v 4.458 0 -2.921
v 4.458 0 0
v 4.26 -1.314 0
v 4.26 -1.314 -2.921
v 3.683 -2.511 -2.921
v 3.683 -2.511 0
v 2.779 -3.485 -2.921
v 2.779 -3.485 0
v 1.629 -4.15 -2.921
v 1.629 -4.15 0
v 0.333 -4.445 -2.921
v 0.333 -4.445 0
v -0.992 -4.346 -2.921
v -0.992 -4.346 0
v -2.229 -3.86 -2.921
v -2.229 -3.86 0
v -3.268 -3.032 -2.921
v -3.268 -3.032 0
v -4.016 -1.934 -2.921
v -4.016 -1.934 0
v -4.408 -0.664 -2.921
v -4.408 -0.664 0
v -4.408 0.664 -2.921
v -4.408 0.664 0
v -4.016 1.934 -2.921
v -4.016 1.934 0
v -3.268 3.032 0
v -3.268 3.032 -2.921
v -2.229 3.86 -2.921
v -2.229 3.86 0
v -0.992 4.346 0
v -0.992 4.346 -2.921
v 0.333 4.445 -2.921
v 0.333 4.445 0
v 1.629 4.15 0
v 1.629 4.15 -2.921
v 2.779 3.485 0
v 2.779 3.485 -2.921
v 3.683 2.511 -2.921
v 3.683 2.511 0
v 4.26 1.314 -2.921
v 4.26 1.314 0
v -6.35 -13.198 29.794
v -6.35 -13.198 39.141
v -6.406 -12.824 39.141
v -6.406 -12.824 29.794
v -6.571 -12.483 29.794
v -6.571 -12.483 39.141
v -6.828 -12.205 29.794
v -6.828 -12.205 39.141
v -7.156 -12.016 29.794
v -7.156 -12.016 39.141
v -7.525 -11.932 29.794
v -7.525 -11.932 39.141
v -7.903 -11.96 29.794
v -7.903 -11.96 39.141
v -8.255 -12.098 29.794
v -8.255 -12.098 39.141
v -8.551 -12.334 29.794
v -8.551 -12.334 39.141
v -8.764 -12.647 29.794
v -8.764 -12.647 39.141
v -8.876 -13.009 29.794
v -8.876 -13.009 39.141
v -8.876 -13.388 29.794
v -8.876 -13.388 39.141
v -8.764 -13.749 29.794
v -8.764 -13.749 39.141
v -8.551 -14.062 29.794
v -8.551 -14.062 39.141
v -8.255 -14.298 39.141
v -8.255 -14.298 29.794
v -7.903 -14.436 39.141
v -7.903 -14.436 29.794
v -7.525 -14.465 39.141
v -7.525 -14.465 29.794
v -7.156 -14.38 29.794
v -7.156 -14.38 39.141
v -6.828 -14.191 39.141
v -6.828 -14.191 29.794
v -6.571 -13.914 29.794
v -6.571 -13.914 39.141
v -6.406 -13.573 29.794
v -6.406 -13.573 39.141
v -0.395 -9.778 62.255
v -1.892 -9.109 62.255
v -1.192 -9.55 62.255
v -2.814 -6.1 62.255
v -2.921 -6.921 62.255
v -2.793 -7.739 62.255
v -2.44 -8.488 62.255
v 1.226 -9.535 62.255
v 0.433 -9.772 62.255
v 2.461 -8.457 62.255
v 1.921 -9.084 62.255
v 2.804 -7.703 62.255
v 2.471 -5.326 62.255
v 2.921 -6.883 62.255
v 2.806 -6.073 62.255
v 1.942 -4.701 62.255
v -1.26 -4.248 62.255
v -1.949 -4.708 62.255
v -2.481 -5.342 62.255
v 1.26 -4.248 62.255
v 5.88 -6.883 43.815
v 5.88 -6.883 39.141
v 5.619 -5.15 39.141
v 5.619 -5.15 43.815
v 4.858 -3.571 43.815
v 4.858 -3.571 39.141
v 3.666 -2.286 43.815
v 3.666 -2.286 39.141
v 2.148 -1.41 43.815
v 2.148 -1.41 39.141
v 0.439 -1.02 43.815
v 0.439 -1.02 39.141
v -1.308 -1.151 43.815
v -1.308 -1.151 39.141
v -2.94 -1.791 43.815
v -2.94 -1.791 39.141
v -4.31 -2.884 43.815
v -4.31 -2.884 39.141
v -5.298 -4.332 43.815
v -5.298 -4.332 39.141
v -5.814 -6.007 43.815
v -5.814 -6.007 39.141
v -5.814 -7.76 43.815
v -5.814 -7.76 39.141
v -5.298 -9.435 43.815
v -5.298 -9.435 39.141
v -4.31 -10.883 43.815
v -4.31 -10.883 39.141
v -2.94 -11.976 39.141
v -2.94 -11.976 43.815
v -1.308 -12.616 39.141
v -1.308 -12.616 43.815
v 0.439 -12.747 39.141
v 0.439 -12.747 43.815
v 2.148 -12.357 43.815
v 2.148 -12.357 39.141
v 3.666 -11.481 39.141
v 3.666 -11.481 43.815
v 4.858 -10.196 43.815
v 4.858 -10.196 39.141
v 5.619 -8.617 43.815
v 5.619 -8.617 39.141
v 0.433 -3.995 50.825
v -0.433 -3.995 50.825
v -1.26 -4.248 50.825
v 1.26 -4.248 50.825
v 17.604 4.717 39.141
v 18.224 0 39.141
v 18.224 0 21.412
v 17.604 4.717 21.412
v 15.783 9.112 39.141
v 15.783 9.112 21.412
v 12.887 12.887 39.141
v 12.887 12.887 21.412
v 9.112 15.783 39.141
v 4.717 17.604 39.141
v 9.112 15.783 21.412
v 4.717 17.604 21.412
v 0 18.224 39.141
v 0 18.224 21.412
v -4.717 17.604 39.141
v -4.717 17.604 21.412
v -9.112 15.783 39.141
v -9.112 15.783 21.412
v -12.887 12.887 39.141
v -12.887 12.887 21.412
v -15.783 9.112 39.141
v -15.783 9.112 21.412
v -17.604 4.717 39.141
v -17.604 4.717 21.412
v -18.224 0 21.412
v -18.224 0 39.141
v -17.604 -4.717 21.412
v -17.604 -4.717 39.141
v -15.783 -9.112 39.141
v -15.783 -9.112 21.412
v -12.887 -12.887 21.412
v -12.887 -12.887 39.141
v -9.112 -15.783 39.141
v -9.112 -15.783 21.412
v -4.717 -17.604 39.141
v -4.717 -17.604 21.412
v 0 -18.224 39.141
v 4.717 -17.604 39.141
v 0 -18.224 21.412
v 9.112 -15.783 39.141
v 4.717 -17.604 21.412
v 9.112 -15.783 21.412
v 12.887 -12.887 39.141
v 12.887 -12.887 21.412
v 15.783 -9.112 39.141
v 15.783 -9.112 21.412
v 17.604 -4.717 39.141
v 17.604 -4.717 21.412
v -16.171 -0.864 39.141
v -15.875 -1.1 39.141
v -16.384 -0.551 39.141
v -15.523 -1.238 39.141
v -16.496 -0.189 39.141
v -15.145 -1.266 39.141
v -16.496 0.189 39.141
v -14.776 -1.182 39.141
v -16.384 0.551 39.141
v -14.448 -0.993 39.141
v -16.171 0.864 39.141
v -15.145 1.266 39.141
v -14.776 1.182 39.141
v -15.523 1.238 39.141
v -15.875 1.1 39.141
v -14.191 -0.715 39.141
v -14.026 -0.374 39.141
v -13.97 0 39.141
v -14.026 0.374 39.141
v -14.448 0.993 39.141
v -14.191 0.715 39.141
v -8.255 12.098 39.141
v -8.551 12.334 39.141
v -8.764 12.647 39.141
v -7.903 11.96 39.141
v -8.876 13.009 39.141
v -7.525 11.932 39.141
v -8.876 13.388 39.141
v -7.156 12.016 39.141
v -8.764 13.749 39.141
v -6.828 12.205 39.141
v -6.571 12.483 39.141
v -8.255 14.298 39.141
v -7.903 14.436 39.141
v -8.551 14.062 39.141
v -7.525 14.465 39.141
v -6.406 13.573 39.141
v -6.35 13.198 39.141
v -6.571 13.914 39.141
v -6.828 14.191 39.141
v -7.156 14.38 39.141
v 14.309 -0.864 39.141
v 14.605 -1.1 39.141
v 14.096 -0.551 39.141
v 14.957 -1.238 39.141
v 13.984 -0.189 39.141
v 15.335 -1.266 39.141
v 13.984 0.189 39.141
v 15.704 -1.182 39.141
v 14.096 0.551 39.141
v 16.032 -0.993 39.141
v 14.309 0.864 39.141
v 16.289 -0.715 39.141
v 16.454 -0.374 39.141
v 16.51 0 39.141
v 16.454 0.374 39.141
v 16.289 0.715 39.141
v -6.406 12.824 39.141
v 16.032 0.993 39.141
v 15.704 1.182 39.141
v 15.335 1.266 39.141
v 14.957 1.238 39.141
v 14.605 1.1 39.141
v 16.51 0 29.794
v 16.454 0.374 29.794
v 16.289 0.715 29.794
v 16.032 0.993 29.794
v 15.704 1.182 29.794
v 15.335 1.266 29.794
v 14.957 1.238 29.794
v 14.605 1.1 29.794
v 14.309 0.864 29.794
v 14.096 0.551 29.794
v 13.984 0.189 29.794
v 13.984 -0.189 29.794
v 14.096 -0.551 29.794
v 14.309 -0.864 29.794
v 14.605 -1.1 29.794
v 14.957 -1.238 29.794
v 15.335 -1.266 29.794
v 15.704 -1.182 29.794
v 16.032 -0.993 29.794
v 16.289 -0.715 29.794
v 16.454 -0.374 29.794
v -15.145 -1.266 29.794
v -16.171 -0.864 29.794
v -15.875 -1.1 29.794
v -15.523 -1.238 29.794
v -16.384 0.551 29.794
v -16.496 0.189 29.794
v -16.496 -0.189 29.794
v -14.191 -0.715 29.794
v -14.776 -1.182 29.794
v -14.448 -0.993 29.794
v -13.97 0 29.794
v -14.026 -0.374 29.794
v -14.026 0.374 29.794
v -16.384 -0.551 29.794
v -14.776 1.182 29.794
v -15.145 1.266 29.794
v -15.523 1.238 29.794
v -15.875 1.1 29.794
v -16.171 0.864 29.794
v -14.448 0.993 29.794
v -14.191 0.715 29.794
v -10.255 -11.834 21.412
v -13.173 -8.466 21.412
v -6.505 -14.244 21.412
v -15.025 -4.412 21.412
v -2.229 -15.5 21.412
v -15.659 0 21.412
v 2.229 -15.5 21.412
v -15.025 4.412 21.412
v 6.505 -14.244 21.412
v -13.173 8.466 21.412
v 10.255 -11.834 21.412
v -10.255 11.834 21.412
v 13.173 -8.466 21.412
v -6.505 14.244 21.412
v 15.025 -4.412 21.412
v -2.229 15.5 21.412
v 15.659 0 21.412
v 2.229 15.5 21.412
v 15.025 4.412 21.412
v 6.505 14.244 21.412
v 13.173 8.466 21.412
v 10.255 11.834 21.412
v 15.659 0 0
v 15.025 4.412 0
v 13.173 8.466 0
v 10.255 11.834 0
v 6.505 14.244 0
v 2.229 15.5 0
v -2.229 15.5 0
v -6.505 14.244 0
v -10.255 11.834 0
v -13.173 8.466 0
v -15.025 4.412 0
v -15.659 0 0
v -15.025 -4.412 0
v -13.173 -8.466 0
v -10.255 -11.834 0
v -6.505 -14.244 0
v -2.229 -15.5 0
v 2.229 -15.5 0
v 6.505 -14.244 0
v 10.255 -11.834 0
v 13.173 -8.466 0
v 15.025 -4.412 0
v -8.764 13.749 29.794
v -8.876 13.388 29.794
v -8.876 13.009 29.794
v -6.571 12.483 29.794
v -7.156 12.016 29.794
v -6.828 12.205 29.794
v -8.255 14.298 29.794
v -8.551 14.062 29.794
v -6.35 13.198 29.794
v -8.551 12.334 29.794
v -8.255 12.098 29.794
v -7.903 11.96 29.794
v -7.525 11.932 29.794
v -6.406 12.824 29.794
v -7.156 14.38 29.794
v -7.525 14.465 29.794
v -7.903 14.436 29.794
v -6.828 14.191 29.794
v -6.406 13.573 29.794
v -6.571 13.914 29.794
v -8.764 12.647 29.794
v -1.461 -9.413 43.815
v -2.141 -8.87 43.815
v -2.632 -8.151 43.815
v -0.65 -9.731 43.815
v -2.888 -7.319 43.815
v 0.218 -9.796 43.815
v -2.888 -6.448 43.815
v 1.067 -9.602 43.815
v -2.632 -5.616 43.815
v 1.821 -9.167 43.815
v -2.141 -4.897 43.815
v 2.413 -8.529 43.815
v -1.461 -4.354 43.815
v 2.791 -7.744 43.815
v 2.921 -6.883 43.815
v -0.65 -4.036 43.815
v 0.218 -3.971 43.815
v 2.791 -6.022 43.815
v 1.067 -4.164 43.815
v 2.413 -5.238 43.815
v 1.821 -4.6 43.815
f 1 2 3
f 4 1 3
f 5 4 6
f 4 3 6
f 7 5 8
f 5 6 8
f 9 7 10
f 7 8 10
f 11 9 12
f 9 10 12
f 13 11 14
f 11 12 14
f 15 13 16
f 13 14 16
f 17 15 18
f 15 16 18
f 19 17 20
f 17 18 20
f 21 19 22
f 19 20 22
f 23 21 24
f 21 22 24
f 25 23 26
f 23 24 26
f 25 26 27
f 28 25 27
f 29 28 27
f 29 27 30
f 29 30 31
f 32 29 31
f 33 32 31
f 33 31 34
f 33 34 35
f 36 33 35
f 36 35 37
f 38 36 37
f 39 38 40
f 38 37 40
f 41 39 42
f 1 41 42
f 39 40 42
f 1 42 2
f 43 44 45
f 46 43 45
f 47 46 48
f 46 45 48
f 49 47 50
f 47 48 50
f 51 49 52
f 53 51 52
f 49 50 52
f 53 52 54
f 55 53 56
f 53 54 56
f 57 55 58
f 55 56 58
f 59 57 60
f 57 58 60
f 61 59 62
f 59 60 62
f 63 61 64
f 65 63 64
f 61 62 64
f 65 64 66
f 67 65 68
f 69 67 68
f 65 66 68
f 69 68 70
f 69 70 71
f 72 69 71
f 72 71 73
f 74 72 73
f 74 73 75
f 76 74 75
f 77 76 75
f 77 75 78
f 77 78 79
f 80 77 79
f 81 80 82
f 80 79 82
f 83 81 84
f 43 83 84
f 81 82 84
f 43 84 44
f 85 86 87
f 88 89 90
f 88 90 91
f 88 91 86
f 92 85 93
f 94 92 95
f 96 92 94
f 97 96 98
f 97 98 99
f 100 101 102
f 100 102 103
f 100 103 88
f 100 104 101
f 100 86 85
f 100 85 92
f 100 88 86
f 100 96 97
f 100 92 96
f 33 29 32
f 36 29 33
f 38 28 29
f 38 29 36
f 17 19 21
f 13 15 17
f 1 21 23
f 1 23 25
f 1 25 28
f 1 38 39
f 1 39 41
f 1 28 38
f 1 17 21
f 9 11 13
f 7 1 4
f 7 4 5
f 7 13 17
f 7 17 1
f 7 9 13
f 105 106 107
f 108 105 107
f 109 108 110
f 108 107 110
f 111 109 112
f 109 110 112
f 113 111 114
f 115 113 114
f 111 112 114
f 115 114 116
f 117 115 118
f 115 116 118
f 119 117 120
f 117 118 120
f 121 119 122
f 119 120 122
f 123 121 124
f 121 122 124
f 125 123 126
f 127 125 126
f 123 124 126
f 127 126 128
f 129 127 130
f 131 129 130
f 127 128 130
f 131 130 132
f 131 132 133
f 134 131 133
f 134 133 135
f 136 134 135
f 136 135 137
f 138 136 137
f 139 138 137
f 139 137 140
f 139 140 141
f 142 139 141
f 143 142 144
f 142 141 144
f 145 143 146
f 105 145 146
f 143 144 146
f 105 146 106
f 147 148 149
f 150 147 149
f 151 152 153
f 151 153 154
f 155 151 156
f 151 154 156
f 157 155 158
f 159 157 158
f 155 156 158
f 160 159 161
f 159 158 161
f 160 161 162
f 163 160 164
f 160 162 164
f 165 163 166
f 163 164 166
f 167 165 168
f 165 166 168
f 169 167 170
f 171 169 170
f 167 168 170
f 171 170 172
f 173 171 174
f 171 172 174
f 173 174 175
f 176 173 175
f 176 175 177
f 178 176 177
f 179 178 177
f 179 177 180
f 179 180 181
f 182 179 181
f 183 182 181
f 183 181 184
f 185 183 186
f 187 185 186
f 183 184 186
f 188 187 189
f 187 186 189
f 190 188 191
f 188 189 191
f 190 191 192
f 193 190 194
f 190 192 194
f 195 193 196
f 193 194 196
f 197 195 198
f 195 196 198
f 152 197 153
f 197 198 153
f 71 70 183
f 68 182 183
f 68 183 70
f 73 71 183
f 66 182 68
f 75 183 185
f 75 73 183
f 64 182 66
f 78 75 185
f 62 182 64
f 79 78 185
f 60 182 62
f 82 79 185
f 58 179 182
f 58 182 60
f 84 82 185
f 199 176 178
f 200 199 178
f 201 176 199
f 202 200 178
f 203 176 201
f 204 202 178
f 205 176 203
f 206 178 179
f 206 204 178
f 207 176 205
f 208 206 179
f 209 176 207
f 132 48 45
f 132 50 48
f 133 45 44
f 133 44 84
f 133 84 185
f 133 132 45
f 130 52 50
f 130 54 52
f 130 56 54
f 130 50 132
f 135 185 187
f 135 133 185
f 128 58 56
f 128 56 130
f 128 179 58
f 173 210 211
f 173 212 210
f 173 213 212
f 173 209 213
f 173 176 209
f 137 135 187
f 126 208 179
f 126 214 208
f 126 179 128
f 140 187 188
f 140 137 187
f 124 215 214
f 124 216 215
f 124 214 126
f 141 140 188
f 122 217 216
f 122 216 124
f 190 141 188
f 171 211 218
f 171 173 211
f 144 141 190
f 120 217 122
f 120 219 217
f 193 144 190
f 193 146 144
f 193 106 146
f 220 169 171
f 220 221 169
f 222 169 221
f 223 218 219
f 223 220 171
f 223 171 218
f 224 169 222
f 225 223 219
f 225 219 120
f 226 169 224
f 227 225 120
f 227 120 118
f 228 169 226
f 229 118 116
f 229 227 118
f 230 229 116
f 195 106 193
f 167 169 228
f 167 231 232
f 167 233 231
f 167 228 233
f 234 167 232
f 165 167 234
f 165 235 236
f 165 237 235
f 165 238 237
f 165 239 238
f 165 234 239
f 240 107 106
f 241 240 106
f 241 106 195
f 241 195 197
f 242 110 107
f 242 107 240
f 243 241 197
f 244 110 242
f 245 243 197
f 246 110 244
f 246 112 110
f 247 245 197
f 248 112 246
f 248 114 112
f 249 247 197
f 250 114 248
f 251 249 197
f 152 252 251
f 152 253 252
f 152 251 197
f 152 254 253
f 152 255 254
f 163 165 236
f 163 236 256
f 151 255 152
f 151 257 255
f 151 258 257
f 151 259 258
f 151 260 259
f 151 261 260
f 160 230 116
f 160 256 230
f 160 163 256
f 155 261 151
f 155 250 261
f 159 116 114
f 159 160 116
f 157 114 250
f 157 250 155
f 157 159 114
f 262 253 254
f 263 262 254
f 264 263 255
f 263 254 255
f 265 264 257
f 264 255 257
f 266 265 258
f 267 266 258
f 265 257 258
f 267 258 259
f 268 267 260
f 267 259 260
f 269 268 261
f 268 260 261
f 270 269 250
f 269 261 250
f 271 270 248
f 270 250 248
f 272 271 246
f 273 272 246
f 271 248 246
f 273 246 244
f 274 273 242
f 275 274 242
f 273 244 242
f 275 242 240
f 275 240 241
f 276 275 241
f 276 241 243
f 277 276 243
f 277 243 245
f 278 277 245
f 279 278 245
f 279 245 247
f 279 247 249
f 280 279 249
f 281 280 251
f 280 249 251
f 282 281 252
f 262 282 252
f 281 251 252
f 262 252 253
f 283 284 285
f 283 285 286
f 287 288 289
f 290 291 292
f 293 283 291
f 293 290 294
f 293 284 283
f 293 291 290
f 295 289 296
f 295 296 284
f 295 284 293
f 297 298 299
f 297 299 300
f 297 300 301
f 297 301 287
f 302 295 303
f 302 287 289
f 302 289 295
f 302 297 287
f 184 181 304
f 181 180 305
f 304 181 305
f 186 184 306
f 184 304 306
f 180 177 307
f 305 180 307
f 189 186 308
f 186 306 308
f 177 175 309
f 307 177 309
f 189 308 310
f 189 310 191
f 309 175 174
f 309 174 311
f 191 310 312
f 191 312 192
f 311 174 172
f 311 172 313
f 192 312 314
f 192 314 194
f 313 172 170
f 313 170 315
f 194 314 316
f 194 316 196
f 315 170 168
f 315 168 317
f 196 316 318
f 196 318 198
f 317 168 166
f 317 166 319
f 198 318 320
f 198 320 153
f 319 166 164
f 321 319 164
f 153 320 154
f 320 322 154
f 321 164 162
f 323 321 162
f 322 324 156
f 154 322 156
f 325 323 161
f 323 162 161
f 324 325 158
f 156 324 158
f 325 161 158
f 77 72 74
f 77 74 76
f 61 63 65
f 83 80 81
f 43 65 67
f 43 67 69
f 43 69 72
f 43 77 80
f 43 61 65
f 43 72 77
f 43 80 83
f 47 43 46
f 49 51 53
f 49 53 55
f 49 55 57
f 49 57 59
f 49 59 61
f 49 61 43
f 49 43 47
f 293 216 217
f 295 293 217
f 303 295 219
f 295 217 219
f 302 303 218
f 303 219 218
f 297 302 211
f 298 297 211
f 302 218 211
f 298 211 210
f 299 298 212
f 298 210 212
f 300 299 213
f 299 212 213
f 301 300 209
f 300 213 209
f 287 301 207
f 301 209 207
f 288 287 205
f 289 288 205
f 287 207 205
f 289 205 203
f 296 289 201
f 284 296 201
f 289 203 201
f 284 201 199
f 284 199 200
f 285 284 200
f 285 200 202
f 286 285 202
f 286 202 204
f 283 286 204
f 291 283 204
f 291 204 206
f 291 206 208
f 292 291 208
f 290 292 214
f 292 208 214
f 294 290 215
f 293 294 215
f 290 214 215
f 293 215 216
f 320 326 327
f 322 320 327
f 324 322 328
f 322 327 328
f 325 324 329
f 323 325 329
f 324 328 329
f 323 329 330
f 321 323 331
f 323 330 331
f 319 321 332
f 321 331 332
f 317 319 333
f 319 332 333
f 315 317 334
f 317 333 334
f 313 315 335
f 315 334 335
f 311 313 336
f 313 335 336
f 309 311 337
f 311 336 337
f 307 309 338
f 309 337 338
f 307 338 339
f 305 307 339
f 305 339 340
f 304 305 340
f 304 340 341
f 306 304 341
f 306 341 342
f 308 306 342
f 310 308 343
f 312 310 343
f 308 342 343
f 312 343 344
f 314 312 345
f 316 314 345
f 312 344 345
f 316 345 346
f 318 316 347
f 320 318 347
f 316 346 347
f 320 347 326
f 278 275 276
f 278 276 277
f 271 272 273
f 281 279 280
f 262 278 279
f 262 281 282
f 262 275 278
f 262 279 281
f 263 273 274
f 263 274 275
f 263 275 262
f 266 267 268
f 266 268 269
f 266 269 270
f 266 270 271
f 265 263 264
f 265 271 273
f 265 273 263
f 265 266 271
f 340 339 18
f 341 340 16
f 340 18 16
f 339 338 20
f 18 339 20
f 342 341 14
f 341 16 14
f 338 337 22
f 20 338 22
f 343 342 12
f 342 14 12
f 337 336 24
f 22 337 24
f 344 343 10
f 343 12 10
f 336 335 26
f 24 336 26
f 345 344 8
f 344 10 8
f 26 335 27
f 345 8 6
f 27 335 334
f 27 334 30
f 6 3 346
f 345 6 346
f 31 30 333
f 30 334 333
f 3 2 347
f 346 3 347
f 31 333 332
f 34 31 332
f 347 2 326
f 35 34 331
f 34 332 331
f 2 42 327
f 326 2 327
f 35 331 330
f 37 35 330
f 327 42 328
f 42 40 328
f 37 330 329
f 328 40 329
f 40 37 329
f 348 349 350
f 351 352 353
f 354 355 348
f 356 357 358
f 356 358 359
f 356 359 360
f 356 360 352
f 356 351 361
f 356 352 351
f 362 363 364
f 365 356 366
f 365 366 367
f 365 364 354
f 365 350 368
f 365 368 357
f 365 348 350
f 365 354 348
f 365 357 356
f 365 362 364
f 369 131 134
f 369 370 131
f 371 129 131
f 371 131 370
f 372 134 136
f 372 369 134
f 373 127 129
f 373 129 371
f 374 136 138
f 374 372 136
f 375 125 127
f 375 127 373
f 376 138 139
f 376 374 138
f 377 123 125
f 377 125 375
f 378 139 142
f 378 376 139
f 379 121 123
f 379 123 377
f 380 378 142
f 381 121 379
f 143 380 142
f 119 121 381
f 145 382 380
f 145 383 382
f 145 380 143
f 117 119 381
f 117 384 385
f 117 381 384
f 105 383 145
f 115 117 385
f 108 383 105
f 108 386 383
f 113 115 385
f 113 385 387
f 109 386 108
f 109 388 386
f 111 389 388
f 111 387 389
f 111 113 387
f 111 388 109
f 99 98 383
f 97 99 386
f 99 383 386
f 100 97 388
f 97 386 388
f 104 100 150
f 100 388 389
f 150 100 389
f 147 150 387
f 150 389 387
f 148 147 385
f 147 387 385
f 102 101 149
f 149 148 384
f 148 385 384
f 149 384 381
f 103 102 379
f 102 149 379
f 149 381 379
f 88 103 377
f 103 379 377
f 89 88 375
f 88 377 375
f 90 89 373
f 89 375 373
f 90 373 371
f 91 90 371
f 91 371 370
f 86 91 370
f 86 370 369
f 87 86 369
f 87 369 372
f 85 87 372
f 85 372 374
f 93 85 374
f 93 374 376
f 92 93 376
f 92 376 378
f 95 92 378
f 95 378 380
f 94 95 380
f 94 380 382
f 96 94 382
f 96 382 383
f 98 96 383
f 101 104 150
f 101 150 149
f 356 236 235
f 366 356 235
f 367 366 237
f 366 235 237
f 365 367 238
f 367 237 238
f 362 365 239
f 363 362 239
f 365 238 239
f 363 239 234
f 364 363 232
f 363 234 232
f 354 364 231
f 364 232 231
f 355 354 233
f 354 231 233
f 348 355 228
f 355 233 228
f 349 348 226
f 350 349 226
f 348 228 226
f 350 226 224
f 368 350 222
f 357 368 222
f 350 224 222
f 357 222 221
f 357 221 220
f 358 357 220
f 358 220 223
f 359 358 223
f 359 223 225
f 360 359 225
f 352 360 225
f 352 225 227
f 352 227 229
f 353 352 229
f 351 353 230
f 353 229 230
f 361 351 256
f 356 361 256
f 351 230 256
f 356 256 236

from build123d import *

# Parameters (mm, degrees)
SKETCH1_R          = 15.6591
MOTOR_DEPTH        = 21.4122
SKETCH3_R          = 18.2245
GEARBOX_DEPTH      = 17.7292
SKETCH4_R          = 5.8801
PROTRUSION_DEPTH   = 4.6736
SKETCH5_R          = 2.921
SHAFT_DEPTH        = 18.4404
SKETCH6_R          = 1.27
SCREW_HOLES_DEPTH  = 9.3472
SKETCH7_R          = 4.4577
NUB_DEPTH          = 2.921
CUT_EXTRUDE1_DEPTH = 11.43


with BuildPart() as part:
    # Sketch1 → motor (new body)
    with BuildSketch(Plane.XY):
        Circle(SKETCH1_R)
    extrude(amount=MOTOR_DEPTH)

    # Sketch3 → gearbox (add)
    with BuildSketch(Plane.XY.offset(21.4122)):
        Circle(SKETCH3_R)
    extrude(amount=GEARBOX_DEPTH)

    # Sketch4 → protrusion (add)
    with BuildSketch(Plane.XY.offset(39.1414)):
        with Locations((0, -6.8834)):
            Circle(SKETCH4_R)
    extrude(amount=PROTRUSION_DEPTH)

    # Sketch5 → shaft (add)
    with BuildSketch(Plane.XY.offset(43.815)):
        with Locations((0, -6.8834)):
            Circle(SKETCH5_R)
    extrude(amount=SHAFT_DEPTH)

    # Sketch6 → screw holes (cut)
    with BuildSketch(Plane.XY.offset(39.1414)):
        with Locations((15.24, 0)):
            Circle(SKETCH6_R)
        with Locations((-15.24, 0)):
            Circle(SKETCH6_R)
        with Locations((-7.62, -13.198227096)):
            Circle(SKETCH6_R)
        with Locations((-7.61999995, 13.198227183)):
            Circle(SKETCH6_R)
    extrude(amount=-SCREW_HOLES_DEPTH, mode=Mode.SUBTRACT)

    # Sketch7 → nub (add)
    with BuildSketch(Plane(origin=(0, 0, 0), x_dir=(-1, 0, 0), z_dir=(0, 0, -1))):
        with Locations(Location((0, 0, 0), (0, 0, 180))):  # turned: the seam where the file's is
            Circle(SKETCH7_R)
    extrude(amount=NUB_DEPTH)

    # Sketch8 → Cut-Extrude1 (cut)
    with BuildSketch(Plane.XY.offset(62.2554)):
        with BuildLine():
            Line((1.260039062, -4.24815), (-1.260039062, -4.24815))
            ThreePointArc((-1.260039062, -4.24815), (0, -3.9624), (1.260039062, -4.24815))
        make_face()
    extrude(amount=-CUT_EXTRUDE1_DEPTH, mode=Mode.SUBTRACT)


solid = part.part
